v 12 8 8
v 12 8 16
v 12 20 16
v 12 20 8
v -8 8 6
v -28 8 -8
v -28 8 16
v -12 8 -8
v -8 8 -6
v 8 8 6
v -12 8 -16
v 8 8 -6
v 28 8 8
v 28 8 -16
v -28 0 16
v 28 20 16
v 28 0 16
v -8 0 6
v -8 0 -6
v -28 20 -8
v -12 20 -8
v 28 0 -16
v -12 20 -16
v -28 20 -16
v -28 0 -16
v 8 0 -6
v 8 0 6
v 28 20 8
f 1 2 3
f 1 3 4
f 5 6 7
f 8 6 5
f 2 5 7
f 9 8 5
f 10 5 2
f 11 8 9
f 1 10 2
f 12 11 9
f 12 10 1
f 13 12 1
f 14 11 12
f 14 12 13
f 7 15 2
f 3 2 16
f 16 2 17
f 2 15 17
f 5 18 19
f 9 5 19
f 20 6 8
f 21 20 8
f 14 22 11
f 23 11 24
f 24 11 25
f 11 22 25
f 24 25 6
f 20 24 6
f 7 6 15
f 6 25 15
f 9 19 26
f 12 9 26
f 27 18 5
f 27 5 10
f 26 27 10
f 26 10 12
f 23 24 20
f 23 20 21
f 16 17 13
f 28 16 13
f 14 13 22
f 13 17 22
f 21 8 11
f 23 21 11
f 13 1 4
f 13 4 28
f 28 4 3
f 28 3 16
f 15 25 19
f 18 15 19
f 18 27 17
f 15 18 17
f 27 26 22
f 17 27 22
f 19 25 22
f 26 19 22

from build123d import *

# Parameters (mm, degrees)
SKETCH1_3_W         = 16
SKETCH1_3_H         = 12
BOSS_EXTRUDE2_DEPTH = 8
SKETCH1_4_W         = 16
SKETCH1_4_H         = 8
BOSS_EXTRUDE3_DEPTH = 20


with BuildPart() as part:
    # Sketch1<3> → Boss-Extrude2 (new body)
    with BuildSketch(Plane(origin=(0, 0, 0), x_dir=(1, 0, 0), z_dir=(0, 1, 0))):
        Polygon((-28, 8), (-28, -16), (12, -16), (12, -8), (28, -8), (28, 16), (-12, 16), (-12, 8), align=None)
        Rectangle(SKETCH1_3_W, SKETCH1_3_H, mode=Mode.SUBTRACT)
    extrude(amount=BOSS_EXTRUDE2_DEPTH)

    # Sketch1<4> → Boss-Extrude3 (add)
    with BuildSketch(Plane(origin=(0, 0, 0), x_dir=(1, 0, 0), z_dir=(0, 1, 0))):
        with Locations((20, -12)):
            Rectangle(SKETCH1_4_W, SKETCH1_4_H)
        with Locations((-20, 12)):
            Rectangle(SKETCH1_4_W, SKETCH1_4_H)
    extrude(amount=BOSS_EXTRUDE3_DEPTH)


solid = part.part
